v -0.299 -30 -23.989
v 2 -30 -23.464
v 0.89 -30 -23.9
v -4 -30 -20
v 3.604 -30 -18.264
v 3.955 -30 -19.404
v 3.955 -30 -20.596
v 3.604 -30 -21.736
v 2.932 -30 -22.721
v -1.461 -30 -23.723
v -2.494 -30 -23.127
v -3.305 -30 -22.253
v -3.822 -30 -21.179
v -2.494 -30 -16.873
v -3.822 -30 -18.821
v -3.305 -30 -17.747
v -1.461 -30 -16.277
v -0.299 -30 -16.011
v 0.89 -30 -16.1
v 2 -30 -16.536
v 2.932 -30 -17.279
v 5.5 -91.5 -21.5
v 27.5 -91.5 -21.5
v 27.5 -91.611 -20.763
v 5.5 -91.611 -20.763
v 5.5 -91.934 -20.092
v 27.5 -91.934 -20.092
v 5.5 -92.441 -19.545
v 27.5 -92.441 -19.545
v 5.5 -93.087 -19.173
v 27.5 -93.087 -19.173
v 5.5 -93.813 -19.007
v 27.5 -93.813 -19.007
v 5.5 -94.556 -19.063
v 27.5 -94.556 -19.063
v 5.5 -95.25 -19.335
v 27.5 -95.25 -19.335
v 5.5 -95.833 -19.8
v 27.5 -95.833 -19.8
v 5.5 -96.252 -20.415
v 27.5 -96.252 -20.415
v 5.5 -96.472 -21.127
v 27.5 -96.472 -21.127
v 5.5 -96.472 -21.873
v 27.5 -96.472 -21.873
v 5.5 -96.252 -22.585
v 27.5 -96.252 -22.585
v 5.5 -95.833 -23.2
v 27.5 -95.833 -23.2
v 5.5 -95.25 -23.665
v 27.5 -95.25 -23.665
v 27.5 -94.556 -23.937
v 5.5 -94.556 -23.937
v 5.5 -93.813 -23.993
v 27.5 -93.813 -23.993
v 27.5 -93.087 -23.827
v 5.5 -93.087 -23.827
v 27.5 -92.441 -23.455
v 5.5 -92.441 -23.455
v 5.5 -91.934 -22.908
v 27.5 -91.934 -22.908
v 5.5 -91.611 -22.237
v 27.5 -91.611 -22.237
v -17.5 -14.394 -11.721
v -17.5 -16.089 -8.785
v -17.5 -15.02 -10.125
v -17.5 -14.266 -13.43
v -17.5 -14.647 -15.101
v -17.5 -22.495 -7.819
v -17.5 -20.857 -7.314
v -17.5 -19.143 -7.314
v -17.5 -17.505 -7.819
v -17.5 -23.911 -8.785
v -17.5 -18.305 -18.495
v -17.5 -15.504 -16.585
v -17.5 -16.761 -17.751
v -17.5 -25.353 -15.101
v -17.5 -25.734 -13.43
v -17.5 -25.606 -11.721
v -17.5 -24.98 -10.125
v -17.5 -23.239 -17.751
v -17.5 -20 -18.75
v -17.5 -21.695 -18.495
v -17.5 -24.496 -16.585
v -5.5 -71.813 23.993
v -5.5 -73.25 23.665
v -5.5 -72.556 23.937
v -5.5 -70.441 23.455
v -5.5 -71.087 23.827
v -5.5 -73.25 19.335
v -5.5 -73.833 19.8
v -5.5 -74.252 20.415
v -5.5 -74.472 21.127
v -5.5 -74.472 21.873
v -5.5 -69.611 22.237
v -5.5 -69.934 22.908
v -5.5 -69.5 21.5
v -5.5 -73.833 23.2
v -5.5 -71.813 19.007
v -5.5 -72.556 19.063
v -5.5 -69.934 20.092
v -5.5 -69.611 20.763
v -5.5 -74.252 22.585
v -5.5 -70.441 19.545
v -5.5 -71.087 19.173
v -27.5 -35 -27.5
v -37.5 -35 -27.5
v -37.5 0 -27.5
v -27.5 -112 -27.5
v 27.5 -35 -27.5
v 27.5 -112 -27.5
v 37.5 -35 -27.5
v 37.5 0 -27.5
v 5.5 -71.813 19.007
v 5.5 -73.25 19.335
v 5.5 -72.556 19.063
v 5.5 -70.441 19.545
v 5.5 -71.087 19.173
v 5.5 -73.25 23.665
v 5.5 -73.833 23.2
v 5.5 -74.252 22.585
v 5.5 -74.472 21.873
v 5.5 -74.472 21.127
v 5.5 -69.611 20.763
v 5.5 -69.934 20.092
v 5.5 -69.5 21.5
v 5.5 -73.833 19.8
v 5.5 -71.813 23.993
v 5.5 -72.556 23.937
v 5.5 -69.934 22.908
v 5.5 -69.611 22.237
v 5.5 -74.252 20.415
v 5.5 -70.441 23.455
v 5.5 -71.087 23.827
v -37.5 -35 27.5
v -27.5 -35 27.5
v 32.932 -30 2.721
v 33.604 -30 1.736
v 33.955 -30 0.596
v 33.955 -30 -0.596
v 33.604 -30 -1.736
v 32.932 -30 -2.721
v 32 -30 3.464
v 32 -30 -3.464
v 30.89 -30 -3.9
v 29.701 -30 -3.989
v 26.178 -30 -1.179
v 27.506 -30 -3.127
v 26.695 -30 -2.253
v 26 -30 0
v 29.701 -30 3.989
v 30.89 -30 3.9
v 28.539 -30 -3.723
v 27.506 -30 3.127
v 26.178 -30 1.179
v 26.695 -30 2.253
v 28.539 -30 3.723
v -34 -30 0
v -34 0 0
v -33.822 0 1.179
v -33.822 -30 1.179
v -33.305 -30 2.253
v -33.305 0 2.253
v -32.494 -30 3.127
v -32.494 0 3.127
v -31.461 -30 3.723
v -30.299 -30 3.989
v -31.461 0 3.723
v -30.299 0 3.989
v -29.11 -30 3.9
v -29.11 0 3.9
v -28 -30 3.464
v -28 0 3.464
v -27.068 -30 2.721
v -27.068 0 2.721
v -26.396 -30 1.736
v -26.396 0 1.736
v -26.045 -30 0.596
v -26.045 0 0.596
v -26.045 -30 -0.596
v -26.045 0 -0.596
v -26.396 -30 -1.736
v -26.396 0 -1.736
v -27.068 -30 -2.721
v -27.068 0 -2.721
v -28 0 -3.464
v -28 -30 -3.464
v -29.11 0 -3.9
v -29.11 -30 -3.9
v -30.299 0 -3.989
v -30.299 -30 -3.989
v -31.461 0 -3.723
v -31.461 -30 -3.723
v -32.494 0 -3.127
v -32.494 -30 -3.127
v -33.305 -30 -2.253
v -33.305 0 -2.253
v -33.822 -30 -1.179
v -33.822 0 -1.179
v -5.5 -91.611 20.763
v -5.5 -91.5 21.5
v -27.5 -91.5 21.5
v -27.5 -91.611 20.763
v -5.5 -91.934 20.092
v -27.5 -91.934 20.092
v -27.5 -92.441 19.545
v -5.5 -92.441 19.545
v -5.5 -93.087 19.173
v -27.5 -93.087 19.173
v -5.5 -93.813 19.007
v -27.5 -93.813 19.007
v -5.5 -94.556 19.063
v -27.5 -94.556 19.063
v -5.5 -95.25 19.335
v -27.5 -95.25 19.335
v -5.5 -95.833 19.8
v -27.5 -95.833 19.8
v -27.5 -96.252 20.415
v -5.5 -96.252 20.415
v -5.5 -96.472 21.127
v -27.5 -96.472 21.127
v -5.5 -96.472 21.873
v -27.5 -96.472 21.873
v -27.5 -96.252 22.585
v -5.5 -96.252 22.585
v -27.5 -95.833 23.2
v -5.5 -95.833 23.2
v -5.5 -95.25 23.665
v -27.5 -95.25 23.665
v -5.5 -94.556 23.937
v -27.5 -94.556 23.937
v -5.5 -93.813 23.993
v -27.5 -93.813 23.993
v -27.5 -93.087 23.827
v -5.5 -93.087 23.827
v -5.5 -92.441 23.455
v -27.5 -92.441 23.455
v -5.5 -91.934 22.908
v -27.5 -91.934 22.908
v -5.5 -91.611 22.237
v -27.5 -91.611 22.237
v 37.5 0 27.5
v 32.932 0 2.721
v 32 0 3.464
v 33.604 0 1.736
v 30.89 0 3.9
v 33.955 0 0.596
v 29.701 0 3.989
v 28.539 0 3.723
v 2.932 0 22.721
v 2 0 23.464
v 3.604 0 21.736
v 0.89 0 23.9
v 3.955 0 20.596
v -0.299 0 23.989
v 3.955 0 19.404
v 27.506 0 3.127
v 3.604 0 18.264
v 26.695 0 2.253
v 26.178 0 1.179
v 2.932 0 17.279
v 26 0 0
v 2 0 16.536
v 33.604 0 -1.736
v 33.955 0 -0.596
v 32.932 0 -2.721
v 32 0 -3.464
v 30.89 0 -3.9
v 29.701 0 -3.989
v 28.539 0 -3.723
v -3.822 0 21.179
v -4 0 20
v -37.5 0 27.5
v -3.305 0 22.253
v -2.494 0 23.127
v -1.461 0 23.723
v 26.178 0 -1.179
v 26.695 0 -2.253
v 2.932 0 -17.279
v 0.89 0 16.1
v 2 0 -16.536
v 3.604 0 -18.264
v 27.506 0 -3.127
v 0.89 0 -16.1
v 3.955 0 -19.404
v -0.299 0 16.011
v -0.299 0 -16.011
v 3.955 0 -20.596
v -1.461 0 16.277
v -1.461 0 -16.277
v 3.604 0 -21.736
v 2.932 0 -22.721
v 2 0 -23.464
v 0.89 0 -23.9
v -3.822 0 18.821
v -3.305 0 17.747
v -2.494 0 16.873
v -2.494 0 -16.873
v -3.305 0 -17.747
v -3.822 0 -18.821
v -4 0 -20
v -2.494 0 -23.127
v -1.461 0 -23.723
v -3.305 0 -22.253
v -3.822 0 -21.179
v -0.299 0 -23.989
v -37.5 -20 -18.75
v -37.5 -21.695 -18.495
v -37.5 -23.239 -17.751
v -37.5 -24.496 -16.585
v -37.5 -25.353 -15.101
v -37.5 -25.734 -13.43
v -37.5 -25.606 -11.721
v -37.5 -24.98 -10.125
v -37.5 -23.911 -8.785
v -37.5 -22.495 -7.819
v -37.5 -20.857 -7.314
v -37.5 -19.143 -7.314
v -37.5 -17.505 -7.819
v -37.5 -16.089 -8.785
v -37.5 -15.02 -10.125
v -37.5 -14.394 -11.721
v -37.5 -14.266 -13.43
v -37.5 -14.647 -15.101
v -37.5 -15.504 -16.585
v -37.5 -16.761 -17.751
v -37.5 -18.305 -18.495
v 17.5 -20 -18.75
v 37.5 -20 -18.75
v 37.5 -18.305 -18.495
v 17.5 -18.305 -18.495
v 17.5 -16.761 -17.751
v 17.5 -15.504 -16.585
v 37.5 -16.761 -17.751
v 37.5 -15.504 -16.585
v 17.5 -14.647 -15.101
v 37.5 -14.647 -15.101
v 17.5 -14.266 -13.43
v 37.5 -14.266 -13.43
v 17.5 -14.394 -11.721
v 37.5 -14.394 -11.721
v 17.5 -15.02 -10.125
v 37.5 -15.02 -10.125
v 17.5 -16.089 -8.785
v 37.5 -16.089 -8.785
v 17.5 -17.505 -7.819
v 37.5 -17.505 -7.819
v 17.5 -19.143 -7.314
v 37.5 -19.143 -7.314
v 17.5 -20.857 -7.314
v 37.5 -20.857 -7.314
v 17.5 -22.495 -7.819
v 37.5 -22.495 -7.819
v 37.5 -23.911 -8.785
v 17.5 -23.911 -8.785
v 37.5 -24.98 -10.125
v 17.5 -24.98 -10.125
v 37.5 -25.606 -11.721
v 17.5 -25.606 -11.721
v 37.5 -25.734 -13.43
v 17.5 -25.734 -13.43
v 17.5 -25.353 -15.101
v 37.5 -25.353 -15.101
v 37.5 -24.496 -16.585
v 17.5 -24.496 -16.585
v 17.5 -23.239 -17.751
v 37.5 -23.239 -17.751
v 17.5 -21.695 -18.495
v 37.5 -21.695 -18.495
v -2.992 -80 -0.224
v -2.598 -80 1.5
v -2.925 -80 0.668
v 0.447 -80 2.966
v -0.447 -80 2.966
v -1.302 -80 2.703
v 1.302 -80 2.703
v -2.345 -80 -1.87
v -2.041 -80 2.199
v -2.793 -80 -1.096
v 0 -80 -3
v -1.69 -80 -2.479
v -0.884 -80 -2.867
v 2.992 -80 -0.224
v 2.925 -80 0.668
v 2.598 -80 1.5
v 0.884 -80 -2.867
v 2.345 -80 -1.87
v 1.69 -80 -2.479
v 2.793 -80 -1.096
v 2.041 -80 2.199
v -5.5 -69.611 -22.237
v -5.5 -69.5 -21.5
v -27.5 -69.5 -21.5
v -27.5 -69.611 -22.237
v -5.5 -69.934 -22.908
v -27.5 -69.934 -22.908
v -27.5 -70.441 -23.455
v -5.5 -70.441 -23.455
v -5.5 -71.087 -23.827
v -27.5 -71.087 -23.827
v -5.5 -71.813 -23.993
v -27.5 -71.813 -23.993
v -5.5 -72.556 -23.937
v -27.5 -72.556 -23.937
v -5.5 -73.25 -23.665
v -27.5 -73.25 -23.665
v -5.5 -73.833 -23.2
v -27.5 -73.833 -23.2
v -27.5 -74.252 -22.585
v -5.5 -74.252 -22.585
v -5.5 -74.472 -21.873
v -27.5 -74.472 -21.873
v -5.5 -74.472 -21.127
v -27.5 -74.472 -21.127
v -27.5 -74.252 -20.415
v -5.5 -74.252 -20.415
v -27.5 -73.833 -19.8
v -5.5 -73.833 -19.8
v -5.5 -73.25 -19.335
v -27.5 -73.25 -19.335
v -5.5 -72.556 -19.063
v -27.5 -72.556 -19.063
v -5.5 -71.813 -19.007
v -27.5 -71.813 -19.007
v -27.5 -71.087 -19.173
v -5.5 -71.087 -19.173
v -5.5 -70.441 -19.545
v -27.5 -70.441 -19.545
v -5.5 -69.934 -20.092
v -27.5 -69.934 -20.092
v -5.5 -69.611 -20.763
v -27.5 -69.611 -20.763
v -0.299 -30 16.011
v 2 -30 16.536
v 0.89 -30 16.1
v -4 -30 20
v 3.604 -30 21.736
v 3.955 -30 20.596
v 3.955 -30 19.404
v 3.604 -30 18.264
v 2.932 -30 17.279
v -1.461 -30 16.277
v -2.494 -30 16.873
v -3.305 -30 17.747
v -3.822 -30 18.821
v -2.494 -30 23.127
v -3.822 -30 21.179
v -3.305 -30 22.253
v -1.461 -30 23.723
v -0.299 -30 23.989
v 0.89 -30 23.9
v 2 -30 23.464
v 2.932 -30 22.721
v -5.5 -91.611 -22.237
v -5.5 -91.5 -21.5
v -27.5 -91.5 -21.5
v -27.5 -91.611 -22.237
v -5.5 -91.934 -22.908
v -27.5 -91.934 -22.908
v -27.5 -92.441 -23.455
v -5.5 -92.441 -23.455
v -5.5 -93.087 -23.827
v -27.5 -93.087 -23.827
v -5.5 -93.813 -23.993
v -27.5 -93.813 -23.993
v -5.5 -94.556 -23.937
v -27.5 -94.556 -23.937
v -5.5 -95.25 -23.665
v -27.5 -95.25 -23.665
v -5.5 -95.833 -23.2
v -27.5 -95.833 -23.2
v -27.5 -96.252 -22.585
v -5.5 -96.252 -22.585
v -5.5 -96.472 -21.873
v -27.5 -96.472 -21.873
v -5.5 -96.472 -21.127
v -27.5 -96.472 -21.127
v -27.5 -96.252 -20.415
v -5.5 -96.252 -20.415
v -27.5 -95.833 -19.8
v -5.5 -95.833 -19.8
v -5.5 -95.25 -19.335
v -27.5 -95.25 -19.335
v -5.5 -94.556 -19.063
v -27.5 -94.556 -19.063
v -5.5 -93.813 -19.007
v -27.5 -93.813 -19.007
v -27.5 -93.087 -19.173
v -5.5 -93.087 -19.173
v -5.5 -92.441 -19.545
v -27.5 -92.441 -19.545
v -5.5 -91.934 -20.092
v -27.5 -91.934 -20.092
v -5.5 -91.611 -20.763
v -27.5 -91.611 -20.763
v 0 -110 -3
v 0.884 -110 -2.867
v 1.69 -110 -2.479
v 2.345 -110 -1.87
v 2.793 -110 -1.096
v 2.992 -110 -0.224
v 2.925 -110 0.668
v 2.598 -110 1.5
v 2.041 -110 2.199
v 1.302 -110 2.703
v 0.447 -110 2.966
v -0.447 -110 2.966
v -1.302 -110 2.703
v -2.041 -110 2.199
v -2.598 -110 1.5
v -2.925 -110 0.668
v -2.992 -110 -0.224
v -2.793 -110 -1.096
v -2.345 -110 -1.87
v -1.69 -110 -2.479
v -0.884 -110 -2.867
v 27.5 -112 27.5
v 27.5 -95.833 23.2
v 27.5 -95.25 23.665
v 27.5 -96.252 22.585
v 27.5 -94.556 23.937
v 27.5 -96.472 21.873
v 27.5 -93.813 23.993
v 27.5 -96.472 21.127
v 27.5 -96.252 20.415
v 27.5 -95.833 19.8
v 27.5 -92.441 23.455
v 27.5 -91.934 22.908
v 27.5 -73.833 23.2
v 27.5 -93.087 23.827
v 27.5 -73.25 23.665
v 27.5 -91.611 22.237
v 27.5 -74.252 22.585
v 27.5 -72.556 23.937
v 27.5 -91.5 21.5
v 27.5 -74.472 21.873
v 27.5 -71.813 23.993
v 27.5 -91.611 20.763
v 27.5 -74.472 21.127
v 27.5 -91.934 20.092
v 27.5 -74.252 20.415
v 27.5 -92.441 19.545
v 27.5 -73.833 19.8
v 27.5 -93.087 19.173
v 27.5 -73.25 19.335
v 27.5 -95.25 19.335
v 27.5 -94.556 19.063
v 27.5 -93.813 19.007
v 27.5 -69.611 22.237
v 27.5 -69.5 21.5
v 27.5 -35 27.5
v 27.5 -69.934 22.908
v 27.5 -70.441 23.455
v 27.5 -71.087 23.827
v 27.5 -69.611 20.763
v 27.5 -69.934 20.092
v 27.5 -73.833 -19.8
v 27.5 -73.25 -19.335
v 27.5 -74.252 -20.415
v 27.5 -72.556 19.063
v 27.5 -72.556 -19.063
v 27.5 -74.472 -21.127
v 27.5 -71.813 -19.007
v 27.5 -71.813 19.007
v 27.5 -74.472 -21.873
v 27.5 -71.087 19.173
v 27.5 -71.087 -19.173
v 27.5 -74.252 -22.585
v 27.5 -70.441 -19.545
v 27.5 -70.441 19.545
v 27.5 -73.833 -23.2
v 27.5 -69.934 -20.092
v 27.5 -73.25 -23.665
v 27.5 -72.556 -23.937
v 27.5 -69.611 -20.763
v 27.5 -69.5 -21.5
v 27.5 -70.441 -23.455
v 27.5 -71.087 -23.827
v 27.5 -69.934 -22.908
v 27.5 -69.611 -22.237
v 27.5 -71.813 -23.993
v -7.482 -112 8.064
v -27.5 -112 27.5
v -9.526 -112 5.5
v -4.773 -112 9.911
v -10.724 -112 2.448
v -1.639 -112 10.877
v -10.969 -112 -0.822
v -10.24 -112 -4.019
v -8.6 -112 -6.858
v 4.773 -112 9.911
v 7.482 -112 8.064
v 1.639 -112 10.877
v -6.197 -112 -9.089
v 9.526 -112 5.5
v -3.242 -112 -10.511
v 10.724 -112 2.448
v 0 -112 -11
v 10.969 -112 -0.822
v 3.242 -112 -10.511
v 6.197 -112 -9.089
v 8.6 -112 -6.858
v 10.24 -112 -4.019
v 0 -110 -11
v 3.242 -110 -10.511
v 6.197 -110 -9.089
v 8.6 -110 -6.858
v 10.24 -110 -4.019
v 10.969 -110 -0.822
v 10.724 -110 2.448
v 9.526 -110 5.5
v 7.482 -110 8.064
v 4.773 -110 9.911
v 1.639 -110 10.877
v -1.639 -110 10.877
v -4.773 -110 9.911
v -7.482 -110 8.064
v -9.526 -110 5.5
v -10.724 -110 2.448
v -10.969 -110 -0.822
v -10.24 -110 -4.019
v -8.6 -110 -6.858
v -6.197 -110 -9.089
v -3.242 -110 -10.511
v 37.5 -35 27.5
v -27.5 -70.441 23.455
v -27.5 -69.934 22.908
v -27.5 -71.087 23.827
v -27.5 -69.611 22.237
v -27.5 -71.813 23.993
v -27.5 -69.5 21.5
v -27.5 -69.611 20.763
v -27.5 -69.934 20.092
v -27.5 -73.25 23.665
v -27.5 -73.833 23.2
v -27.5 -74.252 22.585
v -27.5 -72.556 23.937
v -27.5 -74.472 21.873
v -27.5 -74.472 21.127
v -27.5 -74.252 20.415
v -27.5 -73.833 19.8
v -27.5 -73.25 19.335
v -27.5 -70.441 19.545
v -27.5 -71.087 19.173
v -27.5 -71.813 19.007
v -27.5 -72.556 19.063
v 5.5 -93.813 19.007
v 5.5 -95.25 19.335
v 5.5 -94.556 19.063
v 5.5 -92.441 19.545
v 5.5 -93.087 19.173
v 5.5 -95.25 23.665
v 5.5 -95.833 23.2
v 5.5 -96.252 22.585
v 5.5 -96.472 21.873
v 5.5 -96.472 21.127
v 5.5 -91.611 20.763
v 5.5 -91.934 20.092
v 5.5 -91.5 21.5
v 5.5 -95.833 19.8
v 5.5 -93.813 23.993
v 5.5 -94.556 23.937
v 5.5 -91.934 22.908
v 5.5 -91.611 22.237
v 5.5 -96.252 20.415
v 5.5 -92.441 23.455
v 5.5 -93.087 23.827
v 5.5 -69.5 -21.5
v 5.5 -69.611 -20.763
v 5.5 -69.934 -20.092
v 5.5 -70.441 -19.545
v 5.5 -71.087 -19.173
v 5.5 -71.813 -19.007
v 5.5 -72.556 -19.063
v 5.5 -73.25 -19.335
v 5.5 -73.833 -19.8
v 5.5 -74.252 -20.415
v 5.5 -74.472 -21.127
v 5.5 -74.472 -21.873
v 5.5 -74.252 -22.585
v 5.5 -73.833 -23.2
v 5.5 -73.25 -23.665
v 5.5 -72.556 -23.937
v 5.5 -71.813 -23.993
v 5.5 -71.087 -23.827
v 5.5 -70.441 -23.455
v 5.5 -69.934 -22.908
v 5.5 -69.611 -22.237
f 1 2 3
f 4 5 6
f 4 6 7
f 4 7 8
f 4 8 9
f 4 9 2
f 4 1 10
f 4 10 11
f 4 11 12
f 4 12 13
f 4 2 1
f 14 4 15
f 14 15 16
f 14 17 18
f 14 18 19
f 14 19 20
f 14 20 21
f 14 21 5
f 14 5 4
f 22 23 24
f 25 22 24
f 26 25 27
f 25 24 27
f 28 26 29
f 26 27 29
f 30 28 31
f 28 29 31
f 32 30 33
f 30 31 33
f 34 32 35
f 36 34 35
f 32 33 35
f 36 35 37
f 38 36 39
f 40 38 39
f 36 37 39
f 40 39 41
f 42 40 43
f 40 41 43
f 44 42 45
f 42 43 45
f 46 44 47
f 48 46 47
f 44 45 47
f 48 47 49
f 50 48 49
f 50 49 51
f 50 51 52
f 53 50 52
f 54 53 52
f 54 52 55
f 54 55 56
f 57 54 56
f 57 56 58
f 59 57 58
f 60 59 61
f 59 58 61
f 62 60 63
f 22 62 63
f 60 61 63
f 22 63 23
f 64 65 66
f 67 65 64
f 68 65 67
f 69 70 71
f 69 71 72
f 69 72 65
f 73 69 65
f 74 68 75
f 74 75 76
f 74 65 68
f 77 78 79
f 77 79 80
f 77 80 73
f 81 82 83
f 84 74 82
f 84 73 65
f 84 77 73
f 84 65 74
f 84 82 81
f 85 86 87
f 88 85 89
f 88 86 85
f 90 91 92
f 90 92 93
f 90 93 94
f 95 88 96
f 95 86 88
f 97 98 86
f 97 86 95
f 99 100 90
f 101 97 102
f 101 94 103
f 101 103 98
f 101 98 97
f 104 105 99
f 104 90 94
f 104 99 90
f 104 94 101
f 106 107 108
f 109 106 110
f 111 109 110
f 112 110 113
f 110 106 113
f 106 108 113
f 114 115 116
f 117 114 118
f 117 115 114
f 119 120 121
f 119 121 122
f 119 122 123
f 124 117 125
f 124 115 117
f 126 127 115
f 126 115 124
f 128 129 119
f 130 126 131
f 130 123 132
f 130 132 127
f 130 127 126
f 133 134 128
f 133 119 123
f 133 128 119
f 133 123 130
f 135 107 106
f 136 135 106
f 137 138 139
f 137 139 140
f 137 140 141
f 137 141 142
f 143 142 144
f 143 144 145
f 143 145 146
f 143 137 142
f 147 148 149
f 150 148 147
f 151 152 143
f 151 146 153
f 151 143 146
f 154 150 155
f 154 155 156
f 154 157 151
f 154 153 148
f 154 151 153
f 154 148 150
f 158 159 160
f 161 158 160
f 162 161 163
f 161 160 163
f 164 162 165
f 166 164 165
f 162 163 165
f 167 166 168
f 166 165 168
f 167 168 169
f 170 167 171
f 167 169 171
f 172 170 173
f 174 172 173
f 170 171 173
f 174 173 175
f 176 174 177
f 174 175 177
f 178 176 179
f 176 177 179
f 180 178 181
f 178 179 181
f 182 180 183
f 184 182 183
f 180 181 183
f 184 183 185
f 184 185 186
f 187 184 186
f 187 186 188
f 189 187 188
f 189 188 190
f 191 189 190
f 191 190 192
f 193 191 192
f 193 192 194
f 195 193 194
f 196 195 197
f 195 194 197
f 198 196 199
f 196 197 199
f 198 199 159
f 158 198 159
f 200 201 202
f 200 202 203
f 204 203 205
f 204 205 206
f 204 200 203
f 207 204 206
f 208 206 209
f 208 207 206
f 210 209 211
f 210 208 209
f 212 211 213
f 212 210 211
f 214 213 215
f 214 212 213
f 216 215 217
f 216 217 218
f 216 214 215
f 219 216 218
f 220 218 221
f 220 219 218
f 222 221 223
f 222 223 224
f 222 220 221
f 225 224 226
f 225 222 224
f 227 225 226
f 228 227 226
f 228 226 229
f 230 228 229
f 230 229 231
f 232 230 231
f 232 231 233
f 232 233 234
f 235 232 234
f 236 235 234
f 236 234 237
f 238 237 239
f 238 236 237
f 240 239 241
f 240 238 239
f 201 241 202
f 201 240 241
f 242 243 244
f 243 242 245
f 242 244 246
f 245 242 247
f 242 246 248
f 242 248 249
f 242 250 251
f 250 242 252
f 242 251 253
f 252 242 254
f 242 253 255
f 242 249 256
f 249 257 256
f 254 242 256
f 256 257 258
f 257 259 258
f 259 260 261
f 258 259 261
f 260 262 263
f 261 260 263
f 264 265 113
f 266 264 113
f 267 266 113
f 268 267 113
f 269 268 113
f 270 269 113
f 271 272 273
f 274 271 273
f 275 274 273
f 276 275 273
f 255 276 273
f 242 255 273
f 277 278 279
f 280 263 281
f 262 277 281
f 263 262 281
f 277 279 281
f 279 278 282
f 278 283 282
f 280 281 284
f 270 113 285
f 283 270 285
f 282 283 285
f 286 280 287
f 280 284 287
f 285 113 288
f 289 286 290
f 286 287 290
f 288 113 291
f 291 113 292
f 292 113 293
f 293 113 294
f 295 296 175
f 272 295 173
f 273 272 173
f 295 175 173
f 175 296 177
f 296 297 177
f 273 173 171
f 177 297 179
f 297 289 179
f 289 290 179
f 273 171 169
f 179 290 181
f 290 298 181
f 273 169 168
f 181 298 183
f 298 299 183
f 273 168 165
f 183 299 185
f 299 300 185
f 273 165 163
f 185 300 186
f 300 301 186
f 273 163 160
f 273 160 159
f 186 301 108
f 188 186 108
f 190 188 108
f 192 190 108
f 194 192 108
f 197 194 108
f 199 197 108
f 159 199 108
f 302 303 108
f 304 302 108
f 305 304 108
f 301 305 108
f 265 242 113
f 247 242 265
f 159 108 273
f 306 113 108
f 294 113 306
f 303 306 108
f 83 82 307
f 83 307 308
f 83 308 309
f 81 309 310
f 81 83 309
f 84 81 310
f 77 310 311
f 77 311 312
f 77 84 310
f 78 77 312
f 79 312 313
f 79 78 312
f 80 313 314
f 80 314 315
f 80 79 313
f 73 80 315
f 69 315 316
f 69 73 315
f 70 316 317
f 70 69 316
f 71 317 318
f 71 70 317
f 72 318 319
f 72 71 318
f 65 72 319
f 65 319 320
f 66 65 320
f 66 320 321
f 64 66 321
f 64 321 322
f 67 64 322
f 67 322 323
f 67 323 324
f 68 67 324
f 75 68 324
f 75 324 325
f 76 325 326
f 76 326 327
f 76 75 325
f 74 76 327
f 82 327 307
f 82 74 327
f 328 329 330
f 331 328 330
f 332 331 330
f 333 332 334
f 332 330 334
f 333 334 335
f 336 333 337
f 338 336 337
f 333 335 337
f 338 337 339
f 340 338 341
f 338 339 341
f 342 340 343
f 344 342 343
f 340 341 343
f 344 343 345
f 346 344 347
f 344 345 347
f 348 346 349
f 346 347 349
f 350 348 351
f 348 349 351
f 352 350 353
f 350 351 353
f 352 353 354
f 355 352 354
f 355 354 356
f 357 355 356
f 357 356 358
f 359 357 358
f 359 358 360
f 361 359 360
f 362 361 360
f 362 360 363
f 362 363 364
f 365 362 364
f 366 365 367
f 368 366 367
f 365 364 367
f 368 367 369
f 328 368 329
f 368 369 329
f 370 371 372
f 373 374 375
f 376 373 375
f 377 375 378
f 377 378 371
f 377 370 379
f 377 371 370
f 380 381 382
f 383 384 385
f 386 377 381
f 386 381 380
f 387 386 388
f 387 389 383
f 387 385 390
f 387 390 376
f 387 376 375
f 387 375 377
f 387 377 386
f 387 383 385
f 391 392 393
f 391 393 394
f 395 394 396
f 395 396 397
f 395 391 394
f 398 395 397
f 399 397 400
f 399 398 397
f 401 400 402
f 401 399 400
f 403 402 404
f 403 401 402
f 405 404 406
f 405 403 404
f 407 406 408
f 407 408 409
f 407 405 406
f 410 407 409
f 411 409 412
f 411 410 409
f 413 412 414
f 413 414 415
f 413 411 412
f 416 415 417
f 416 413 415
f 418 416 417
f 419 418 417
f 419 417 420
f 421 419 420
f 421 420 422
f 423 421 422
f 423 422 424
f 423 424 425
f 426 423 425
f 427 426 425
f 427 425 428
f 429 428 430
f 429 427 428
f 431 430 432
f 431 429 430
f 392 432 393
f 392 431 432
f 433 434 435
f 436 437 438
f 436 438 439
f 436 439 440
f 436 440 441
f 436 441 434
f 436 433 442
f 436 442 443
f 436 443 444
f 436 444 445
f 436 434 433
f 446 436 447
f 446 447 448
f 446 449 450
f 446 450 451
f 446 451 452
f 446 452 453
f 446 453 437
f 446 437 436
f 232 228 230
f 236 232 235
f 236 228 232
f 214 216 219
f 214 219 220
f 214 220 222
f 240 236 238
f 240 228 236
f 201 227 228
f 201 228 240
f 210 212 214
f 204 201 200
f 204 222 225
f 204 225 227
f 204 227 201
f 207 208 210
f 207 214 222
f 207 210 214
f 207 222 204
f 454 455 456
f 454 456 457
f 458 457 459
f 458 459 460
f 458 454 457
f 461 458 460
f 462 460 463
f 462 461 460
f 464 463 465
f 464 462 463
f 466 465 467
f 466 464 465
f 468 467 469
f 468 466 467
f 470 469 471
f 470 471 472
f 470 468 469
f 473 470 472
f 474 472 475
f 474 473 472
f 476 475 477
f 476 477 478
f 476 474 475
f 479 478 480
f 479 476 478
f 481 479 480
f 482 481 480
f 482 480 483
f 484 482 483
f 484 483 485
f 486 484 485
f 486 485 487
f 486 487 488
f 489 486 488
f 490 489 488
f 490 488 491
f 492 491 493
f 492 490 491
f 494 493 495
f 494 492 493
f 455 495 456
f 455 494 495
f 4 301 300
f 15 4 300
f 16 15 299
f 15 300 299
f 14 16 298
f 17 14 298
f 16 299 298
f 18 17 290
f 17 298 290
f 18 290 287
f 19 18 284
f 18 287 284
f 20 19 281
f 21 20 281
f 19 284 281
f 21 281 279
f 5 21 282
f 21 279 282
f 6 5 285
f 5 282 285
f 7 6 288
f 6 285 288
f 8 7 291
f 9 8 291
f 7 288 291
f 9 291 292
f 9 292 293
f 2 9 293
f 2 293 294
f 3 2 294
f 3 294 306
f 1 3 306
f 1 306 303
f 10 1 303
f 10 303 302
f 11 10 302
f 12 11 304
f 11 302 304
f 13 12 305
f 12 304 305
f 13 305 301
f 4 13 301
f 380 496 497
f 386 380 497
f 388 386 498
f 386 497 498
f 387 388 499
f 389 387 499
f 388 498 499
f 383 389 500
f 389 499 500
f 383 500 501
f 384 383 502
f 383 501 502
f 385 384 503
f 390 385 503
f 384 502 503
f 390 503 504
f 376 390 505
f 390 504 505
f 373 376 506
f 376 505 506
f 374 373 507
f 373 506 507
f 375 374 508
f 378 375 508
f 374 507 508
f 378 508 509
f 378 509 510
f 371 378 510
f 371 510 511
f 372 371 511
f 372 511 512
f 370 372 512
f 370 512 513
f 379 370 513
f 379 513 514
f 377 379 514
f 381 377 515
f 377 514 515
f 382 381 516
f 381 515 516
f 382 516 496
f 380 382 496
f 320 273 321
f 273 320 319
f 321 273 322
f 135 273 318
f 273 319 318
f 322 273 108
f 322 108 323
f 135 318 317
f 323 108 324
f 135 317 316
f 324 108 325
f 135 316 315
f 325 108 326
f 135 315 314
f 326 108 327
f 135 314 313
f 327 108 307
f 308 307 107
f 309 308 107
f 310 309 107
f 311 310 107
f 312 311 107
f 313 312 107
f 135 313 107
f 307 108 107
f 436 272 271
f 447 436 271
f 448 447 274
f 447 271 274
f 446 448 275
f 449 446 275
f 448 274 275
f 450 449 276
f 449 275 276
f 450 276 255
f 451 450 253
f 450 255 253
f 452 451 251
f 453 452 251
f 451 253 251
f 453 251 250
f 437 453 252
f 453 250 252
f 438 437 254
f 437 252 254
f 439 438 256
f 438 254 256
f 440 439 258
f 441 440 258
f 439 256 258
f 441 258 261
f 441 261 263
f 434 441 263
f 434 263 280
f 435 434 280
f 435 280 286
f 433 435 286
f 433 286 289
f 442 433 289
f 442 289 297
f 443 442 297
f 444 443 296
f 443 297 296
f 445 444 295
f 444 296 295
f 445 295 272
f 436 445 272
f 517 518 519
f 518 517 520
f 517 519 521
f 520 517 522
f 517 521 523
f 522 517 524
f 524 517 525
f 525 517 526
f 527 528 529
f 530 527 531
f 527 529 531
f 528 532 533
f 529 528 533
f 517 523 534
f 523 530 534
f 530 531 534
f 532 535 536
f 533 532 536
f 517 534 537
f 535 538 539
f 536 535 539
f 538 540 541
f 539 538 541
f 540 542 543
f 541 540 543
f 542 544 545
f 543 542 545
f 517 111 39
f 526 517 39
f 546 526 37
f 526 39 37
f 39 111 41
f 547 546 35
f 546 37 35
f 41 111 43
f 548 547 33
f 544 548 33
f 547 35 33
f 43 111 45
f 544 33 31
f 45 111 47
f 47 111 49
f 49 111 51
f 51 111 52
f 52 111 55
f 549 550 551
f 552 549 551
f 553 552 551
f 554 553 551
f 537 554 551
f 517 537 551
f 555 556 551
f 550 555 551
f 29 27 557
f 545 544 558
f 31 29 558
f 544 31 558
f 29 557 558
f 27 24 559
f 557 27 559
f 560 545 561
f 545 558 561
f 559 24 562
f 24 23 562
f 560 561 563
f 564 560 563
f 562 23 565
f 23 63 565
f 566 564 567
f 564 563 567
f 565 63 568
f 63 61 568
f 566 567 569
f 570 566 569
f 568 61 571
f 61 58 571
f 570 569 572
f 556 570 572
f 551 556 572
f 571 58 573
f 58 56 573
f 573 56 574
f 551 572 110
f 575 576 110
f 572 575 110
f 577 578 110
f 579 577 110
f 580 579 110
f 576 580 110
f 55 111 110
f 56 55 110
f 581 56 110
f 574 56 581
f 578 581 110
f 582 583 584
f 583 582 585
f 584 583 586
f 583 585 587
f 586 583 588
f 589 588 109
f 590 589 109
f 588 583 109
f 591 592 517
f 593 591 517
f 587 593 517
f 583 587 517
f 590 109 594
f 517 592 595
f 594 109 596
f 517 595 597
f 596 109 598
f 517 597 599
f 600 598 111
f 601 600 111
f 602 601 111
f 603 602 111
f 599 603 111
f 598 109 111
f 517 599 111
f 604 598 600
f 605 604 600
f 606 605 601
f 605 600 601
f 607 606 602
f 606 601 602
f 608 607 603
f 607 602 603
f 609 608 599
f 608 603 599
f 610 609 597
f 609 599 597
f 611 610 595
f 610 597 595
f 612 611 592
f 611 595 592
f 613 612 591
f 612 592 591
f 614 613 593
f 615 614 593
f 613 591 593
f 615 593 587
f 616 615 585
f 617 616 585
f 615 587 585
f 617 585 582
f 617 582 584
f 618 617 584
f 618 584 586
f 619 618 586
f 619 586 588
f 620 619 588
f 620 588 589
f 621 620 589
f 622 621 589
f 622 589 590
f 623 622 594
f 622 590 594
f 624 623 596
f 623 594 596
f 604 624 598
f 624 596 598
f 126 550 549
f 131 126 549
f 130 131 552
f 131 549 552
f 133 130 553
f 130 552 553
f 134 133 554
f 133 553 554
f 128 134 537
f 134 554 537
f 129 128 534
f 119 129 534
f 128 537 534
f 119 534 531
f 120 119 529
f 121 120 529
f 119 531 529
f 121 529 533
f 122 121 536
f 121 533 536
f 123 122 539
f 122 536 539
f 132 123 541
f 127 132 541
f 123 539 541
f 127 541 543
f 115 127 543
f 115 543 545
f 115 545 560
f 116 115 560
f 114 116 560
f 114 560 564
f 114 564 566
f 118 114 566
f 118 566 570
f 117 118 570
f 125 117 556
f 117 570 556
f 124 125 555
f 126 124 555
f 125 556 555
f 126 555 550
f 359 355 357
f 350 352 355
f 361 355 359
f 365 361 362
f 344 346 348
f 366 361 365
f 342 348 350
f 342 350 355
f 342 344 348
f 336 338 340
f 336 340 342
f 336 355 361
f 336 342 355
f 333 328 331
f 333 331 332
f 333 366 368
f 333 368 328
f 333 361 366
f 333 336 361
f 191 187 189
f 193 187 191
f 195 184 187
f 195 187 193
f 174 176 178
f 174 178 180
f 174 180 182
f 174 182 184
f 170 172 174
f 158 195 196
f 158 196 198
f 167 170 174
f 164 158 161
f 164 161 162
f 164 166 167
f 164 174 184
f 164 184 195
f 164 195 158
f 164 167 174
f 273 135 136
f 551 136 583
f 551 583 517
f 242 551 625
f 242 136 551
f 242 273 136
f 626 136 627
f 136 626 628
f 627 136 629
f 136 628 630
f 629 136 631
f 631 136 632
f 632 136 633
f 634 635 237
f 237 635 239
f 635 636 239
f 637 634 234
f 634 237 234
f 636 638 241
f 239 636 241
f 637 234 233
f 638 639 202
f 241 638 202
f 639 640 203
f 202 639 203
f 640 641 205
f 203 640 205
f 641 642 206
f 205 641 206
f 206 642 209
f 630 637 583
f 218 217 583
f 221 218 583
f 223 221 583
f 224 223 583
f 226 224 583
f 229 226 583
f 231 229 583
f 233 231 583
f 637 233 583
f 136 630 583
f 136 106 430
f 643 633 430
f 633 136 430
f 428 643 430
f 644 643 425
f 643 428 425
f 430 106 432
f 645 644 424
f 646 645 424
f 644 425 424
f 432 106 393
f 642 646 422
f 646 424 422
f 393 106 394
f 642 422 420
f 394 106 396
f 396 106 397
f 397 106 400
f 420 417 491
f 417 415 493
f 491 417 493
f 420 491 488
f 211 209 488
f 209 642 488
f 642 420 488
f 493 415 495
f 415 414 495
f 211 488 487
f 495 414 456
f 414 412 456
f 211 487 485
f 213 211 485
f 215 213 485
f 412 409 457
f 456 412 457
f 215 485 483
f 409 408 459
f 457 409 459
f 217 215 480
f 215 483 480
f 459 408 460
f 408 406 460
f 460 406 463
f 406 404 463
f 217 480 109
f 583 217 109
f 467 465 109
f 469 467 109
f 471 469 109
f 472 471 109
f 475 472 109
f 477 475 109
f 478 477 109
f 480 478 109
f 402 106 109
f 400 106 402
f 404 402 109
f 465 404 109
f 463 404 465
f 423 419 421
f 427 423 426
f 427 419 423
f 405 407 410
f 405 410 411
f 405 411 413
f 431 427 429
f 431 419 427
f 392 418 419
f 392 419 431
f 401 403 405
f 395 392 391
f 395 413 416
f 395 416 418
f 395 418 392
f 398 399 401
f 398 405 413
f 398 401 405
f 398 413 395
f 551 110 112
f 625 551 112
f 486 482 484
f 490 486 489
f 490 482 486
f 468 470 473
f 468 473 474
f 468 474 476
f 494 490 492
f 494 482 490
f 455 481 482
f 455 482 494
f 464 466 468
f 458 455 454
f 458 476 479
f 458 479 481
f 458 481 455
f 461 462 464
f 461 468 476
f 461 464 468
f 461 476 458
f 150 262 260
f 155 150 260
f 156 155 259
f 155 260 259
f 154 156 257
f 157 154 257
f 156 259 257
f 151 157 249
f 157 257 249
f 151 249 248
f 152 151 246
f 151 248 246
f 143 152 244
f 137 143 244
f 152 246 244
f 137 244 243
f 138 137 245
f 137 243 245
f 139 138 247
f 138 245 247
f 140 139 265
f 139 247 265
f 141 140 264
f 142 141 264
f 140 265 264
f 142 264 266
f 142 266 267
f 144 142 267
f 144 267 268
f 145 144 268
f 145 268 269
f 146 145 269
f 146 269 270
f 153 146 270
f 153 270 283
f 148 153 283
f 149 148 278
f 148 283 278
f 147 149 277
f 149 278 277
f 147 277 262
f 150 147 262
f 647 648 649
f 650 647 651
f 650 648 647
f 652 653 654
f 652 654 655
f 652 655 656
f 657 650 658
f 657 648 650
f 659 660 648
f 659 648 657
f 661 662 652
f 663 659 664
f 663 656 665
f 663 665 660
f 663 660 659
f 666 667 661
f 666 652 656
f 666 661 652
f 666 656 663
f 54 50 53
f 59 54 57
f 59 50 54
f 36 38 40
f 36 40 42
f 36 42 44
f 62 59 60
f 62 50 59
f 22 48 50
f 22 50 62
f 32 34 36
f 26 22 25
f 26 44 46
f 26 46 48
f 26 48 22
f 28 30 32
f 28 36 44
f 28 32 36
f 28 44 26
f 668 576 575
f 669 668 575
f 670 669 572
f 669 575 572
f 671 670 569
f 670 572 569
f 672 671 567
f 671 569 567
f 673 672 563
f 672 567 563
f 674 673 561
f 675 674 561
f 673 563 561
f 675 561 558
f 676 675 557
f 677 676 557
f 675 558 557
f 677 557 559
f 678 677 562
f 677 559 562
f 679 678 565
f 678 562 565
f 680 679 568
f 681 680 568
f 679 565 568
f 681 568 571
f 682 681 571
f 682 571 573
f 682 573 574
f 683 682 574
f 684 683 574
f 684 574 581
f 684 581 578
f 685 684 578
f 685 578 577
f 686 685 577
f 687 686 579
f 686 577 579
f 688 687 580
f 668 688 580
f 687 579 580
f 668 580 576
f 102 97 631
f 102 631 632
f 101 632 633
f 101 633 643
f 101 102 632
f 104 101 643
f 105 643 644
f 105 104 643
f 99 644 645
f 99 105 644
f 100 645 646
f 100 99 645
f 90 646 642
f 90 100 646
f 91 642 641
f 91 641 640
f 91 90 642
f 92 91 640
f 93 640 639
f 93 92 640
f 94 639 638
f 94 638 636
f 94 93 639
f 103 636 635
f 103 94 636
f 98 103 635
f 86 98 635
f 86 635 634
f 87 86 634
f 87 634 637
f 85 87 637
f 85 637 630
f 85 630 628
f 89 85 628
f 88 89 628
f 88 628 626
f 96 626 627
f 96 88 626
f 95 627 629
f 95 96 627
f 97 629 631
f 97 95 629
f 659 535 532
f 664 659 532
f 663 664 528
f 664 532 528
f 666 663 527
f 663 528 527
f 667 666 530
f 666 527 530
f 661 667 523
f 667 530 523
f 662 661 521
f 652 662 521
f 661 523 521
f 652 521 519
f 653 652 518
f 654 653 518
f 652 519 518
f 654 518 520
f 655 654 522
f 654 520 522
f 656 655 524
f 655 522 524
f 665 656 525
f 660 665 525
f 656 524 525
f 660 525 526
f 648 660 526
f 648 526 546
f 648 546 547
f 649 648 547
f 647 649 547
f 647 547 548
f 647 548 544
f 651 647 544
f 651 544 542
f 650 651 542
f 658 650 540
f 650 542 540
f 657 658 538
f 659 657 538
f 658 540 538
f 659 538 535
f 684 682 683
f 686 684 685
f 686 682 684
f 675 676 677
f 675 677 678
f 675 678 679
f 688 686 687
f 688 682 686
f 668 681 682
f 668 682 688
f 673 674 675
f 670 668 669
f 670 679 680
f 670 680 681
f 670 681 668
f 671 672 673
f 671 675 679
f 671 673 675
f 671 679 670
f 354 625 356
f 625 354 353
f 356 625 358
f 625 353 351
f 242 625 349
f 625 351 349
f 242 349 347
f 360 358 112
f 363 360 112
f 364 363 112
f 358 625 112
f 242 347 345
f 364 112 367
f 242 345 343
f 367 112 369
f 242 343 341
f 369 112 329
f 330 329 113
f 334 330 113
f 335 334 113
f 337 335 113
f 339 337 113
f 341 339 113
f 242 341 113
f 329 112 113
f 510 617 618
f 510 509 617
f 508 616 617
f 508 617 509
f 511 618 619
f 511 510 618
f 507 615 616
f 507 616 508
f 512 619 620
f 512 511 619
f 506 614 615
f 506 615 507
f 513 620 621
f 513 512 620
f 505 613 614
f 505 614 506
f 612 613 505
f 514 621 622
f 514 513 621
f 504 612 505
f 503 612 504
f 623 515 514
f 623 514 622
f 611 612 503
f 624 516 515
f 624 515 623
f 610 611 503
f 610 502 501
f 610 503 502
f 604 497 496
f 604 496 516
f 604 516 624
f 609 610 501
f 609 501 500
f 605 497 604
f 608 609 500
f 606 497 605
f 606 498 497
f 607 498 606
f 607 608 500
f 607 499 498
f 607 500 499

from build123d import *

# Parameters (mm, degrees)
SALIENTE_EXTRUIR1_DEPTH      = 27.5
SALIENTE_EXTRUIR1_DEPTH_BACK = 27.5
CROQUIS2_R                   = 4
CORTAR_EXTRUIR1_DEPTH        = 30
CROQUIS3_R                   = 2.5
CORTAR_EXTRUIR2_DEPTH        = 22
CORTAR_EXTRUIR3_START        = -22
CROQUIS4_R                   = 2.5
CORTAR_EXTRUIR3_DEPTH        = 22
CROQUIS5_R                   = 11
CORTAR_EXTRUIR4_DEPTH        = 2
CROQUIS6_R                   = 5.75
CORTAR_EXTRUIR5_DEPTH        = 20
CORTAR_EXTRUIR6_START        = -20
CROQUIS7_R                   = 5.75
CORTAR_EXTRUIR6_DEPTH        = 20
CROQUIS8_R                   = 3
CORTAR_EXTRUIR7_DEPTH        = 30


with BuildPart() as part:
    # Croquis1 → Saliente-Extruir1 (new, two sides: drawn at the far end of the back side and taken through both)
    with BuildSketch(Plane.XY.offset(-SALIENTE_EXTRUIR1_DEPTH_BACK)):
        Polygon((37.5, 0), (-37.5, 0), (-37.5, -35), (-27.5, -35), (-27.5, -112), (27.5, -112), (27.5, -35), (37.5, -35), align=None)
    extrude(amount=SALIENTE_EXTRUIR1_DEPTH + SALIENTE_EXTRUIR1_DEPTH_BACK)

    # Croquis2 → Cortar-Extruir1 (cut)
    with BuildSketch(Plane(origin=(0, 0, 0), x_dir=(1, 0, 0), z_dir=(0, 1, 0))):
        with Locations((-30, 0)):
            Circle(CROQUIS2_R)
        with Locations((0, 20)):
            Circle(CROQUIS2_R)
        with Locations((30, 0)):
            Circle(CROQUIS2_R)
        with Locations((0, -20)):
            Circle(CROQUIS2_R)
    extrude(amount=-CORTAR_EXTRUIR1_DEPTH, mode=Mode.SUBTRACT)

    # Croquis3 → Cortar-Extruir2 (cut)
    with BuildSketch(Plane(origin=(27.5, 0, 0), x_dir=(0, 0, -1), z_dir=(1, 0, 0))):
        with Locations((-21.5, -94)):
            Circle(CROQUIS3_R)
        with Locations((-21.5, -72)):
            Circle(CROQUIS3_R)
        with Locations((21.5, -72)):
            Circle(CROQUIS3_R)
        with Locations((21.5, -94)):
            Circle(CROQUIS3_R)
    extrude(amount=-CORTAR_EXTRUIR2_DEPTH, mode=Mode.SUBTRACT)

    # Croquis4 → Cortar-Extruir3 (cut)
    with BuildSketch(Plane.ZY.offset(27.5).offset(CORTAR_EXTRUIR3_START)):
        with Locations((-21.5, -94)):
            Circle(CROQUIS4_R)
        with Locations((-21.5, -72)):
            Circle(CROQUIS4_R)
        with Locations((21.5, -72)):
            Circle(CROQUIS4_R)
        with Locations((21.5, -94)):
            Circle(CROQUIS4_R)
    extrude(amount=CORTAR_EXTRUIR3_DEPTH, mode=Mode.SUBTRACT)

    # Croquis5 → Cortar-Extruir4 (cut)
    with BuildSketch(Plane.XZ.offset(112)):
        Circle(CROQUIS5_R)
    extrude(amount=-CORTAR_EXTRUIR4_DEPTH, mode=Mode.SUBTRACT)

    # Croquis6 → Cortar-Extruir5 (cut)
    with BuildSketch(Plane(origin=(37.5, 0, 0), x_dir=(0, 0, -1), z_dir=(1, 0, 0))):
        with Locations((13, -20)):
            Circle(CROQUIS6_R)
    extrude(amount=-CORTAR_EXTRUIR5_DEPTH, mode=Mode.SUBTRACT)

    # Croquis7 → Cortar-Extruir6 (cut)
    with BuildSketch(Plane.ZY.offset(37.5).offset(CORTAR_EXTRUIR6_START)):
        with Locations((-13, -20)):
            Circle(CROQUIS7_R)
    extrude(amount=CORTAR_EXTRUIR6_DEPTH, mode=Mode.SUBTRACT)

    # Croquis8 → Cortar-Extruir7 (cut)
    with BuildSketch(Plane.XZ.offset(110)):
        Circle(CROQUIS8_R)
    extrude(amount=-CORTAR_EXTRUIR7_DEPTH, mode=Mode.SUBTRACT)


solid = part.part
